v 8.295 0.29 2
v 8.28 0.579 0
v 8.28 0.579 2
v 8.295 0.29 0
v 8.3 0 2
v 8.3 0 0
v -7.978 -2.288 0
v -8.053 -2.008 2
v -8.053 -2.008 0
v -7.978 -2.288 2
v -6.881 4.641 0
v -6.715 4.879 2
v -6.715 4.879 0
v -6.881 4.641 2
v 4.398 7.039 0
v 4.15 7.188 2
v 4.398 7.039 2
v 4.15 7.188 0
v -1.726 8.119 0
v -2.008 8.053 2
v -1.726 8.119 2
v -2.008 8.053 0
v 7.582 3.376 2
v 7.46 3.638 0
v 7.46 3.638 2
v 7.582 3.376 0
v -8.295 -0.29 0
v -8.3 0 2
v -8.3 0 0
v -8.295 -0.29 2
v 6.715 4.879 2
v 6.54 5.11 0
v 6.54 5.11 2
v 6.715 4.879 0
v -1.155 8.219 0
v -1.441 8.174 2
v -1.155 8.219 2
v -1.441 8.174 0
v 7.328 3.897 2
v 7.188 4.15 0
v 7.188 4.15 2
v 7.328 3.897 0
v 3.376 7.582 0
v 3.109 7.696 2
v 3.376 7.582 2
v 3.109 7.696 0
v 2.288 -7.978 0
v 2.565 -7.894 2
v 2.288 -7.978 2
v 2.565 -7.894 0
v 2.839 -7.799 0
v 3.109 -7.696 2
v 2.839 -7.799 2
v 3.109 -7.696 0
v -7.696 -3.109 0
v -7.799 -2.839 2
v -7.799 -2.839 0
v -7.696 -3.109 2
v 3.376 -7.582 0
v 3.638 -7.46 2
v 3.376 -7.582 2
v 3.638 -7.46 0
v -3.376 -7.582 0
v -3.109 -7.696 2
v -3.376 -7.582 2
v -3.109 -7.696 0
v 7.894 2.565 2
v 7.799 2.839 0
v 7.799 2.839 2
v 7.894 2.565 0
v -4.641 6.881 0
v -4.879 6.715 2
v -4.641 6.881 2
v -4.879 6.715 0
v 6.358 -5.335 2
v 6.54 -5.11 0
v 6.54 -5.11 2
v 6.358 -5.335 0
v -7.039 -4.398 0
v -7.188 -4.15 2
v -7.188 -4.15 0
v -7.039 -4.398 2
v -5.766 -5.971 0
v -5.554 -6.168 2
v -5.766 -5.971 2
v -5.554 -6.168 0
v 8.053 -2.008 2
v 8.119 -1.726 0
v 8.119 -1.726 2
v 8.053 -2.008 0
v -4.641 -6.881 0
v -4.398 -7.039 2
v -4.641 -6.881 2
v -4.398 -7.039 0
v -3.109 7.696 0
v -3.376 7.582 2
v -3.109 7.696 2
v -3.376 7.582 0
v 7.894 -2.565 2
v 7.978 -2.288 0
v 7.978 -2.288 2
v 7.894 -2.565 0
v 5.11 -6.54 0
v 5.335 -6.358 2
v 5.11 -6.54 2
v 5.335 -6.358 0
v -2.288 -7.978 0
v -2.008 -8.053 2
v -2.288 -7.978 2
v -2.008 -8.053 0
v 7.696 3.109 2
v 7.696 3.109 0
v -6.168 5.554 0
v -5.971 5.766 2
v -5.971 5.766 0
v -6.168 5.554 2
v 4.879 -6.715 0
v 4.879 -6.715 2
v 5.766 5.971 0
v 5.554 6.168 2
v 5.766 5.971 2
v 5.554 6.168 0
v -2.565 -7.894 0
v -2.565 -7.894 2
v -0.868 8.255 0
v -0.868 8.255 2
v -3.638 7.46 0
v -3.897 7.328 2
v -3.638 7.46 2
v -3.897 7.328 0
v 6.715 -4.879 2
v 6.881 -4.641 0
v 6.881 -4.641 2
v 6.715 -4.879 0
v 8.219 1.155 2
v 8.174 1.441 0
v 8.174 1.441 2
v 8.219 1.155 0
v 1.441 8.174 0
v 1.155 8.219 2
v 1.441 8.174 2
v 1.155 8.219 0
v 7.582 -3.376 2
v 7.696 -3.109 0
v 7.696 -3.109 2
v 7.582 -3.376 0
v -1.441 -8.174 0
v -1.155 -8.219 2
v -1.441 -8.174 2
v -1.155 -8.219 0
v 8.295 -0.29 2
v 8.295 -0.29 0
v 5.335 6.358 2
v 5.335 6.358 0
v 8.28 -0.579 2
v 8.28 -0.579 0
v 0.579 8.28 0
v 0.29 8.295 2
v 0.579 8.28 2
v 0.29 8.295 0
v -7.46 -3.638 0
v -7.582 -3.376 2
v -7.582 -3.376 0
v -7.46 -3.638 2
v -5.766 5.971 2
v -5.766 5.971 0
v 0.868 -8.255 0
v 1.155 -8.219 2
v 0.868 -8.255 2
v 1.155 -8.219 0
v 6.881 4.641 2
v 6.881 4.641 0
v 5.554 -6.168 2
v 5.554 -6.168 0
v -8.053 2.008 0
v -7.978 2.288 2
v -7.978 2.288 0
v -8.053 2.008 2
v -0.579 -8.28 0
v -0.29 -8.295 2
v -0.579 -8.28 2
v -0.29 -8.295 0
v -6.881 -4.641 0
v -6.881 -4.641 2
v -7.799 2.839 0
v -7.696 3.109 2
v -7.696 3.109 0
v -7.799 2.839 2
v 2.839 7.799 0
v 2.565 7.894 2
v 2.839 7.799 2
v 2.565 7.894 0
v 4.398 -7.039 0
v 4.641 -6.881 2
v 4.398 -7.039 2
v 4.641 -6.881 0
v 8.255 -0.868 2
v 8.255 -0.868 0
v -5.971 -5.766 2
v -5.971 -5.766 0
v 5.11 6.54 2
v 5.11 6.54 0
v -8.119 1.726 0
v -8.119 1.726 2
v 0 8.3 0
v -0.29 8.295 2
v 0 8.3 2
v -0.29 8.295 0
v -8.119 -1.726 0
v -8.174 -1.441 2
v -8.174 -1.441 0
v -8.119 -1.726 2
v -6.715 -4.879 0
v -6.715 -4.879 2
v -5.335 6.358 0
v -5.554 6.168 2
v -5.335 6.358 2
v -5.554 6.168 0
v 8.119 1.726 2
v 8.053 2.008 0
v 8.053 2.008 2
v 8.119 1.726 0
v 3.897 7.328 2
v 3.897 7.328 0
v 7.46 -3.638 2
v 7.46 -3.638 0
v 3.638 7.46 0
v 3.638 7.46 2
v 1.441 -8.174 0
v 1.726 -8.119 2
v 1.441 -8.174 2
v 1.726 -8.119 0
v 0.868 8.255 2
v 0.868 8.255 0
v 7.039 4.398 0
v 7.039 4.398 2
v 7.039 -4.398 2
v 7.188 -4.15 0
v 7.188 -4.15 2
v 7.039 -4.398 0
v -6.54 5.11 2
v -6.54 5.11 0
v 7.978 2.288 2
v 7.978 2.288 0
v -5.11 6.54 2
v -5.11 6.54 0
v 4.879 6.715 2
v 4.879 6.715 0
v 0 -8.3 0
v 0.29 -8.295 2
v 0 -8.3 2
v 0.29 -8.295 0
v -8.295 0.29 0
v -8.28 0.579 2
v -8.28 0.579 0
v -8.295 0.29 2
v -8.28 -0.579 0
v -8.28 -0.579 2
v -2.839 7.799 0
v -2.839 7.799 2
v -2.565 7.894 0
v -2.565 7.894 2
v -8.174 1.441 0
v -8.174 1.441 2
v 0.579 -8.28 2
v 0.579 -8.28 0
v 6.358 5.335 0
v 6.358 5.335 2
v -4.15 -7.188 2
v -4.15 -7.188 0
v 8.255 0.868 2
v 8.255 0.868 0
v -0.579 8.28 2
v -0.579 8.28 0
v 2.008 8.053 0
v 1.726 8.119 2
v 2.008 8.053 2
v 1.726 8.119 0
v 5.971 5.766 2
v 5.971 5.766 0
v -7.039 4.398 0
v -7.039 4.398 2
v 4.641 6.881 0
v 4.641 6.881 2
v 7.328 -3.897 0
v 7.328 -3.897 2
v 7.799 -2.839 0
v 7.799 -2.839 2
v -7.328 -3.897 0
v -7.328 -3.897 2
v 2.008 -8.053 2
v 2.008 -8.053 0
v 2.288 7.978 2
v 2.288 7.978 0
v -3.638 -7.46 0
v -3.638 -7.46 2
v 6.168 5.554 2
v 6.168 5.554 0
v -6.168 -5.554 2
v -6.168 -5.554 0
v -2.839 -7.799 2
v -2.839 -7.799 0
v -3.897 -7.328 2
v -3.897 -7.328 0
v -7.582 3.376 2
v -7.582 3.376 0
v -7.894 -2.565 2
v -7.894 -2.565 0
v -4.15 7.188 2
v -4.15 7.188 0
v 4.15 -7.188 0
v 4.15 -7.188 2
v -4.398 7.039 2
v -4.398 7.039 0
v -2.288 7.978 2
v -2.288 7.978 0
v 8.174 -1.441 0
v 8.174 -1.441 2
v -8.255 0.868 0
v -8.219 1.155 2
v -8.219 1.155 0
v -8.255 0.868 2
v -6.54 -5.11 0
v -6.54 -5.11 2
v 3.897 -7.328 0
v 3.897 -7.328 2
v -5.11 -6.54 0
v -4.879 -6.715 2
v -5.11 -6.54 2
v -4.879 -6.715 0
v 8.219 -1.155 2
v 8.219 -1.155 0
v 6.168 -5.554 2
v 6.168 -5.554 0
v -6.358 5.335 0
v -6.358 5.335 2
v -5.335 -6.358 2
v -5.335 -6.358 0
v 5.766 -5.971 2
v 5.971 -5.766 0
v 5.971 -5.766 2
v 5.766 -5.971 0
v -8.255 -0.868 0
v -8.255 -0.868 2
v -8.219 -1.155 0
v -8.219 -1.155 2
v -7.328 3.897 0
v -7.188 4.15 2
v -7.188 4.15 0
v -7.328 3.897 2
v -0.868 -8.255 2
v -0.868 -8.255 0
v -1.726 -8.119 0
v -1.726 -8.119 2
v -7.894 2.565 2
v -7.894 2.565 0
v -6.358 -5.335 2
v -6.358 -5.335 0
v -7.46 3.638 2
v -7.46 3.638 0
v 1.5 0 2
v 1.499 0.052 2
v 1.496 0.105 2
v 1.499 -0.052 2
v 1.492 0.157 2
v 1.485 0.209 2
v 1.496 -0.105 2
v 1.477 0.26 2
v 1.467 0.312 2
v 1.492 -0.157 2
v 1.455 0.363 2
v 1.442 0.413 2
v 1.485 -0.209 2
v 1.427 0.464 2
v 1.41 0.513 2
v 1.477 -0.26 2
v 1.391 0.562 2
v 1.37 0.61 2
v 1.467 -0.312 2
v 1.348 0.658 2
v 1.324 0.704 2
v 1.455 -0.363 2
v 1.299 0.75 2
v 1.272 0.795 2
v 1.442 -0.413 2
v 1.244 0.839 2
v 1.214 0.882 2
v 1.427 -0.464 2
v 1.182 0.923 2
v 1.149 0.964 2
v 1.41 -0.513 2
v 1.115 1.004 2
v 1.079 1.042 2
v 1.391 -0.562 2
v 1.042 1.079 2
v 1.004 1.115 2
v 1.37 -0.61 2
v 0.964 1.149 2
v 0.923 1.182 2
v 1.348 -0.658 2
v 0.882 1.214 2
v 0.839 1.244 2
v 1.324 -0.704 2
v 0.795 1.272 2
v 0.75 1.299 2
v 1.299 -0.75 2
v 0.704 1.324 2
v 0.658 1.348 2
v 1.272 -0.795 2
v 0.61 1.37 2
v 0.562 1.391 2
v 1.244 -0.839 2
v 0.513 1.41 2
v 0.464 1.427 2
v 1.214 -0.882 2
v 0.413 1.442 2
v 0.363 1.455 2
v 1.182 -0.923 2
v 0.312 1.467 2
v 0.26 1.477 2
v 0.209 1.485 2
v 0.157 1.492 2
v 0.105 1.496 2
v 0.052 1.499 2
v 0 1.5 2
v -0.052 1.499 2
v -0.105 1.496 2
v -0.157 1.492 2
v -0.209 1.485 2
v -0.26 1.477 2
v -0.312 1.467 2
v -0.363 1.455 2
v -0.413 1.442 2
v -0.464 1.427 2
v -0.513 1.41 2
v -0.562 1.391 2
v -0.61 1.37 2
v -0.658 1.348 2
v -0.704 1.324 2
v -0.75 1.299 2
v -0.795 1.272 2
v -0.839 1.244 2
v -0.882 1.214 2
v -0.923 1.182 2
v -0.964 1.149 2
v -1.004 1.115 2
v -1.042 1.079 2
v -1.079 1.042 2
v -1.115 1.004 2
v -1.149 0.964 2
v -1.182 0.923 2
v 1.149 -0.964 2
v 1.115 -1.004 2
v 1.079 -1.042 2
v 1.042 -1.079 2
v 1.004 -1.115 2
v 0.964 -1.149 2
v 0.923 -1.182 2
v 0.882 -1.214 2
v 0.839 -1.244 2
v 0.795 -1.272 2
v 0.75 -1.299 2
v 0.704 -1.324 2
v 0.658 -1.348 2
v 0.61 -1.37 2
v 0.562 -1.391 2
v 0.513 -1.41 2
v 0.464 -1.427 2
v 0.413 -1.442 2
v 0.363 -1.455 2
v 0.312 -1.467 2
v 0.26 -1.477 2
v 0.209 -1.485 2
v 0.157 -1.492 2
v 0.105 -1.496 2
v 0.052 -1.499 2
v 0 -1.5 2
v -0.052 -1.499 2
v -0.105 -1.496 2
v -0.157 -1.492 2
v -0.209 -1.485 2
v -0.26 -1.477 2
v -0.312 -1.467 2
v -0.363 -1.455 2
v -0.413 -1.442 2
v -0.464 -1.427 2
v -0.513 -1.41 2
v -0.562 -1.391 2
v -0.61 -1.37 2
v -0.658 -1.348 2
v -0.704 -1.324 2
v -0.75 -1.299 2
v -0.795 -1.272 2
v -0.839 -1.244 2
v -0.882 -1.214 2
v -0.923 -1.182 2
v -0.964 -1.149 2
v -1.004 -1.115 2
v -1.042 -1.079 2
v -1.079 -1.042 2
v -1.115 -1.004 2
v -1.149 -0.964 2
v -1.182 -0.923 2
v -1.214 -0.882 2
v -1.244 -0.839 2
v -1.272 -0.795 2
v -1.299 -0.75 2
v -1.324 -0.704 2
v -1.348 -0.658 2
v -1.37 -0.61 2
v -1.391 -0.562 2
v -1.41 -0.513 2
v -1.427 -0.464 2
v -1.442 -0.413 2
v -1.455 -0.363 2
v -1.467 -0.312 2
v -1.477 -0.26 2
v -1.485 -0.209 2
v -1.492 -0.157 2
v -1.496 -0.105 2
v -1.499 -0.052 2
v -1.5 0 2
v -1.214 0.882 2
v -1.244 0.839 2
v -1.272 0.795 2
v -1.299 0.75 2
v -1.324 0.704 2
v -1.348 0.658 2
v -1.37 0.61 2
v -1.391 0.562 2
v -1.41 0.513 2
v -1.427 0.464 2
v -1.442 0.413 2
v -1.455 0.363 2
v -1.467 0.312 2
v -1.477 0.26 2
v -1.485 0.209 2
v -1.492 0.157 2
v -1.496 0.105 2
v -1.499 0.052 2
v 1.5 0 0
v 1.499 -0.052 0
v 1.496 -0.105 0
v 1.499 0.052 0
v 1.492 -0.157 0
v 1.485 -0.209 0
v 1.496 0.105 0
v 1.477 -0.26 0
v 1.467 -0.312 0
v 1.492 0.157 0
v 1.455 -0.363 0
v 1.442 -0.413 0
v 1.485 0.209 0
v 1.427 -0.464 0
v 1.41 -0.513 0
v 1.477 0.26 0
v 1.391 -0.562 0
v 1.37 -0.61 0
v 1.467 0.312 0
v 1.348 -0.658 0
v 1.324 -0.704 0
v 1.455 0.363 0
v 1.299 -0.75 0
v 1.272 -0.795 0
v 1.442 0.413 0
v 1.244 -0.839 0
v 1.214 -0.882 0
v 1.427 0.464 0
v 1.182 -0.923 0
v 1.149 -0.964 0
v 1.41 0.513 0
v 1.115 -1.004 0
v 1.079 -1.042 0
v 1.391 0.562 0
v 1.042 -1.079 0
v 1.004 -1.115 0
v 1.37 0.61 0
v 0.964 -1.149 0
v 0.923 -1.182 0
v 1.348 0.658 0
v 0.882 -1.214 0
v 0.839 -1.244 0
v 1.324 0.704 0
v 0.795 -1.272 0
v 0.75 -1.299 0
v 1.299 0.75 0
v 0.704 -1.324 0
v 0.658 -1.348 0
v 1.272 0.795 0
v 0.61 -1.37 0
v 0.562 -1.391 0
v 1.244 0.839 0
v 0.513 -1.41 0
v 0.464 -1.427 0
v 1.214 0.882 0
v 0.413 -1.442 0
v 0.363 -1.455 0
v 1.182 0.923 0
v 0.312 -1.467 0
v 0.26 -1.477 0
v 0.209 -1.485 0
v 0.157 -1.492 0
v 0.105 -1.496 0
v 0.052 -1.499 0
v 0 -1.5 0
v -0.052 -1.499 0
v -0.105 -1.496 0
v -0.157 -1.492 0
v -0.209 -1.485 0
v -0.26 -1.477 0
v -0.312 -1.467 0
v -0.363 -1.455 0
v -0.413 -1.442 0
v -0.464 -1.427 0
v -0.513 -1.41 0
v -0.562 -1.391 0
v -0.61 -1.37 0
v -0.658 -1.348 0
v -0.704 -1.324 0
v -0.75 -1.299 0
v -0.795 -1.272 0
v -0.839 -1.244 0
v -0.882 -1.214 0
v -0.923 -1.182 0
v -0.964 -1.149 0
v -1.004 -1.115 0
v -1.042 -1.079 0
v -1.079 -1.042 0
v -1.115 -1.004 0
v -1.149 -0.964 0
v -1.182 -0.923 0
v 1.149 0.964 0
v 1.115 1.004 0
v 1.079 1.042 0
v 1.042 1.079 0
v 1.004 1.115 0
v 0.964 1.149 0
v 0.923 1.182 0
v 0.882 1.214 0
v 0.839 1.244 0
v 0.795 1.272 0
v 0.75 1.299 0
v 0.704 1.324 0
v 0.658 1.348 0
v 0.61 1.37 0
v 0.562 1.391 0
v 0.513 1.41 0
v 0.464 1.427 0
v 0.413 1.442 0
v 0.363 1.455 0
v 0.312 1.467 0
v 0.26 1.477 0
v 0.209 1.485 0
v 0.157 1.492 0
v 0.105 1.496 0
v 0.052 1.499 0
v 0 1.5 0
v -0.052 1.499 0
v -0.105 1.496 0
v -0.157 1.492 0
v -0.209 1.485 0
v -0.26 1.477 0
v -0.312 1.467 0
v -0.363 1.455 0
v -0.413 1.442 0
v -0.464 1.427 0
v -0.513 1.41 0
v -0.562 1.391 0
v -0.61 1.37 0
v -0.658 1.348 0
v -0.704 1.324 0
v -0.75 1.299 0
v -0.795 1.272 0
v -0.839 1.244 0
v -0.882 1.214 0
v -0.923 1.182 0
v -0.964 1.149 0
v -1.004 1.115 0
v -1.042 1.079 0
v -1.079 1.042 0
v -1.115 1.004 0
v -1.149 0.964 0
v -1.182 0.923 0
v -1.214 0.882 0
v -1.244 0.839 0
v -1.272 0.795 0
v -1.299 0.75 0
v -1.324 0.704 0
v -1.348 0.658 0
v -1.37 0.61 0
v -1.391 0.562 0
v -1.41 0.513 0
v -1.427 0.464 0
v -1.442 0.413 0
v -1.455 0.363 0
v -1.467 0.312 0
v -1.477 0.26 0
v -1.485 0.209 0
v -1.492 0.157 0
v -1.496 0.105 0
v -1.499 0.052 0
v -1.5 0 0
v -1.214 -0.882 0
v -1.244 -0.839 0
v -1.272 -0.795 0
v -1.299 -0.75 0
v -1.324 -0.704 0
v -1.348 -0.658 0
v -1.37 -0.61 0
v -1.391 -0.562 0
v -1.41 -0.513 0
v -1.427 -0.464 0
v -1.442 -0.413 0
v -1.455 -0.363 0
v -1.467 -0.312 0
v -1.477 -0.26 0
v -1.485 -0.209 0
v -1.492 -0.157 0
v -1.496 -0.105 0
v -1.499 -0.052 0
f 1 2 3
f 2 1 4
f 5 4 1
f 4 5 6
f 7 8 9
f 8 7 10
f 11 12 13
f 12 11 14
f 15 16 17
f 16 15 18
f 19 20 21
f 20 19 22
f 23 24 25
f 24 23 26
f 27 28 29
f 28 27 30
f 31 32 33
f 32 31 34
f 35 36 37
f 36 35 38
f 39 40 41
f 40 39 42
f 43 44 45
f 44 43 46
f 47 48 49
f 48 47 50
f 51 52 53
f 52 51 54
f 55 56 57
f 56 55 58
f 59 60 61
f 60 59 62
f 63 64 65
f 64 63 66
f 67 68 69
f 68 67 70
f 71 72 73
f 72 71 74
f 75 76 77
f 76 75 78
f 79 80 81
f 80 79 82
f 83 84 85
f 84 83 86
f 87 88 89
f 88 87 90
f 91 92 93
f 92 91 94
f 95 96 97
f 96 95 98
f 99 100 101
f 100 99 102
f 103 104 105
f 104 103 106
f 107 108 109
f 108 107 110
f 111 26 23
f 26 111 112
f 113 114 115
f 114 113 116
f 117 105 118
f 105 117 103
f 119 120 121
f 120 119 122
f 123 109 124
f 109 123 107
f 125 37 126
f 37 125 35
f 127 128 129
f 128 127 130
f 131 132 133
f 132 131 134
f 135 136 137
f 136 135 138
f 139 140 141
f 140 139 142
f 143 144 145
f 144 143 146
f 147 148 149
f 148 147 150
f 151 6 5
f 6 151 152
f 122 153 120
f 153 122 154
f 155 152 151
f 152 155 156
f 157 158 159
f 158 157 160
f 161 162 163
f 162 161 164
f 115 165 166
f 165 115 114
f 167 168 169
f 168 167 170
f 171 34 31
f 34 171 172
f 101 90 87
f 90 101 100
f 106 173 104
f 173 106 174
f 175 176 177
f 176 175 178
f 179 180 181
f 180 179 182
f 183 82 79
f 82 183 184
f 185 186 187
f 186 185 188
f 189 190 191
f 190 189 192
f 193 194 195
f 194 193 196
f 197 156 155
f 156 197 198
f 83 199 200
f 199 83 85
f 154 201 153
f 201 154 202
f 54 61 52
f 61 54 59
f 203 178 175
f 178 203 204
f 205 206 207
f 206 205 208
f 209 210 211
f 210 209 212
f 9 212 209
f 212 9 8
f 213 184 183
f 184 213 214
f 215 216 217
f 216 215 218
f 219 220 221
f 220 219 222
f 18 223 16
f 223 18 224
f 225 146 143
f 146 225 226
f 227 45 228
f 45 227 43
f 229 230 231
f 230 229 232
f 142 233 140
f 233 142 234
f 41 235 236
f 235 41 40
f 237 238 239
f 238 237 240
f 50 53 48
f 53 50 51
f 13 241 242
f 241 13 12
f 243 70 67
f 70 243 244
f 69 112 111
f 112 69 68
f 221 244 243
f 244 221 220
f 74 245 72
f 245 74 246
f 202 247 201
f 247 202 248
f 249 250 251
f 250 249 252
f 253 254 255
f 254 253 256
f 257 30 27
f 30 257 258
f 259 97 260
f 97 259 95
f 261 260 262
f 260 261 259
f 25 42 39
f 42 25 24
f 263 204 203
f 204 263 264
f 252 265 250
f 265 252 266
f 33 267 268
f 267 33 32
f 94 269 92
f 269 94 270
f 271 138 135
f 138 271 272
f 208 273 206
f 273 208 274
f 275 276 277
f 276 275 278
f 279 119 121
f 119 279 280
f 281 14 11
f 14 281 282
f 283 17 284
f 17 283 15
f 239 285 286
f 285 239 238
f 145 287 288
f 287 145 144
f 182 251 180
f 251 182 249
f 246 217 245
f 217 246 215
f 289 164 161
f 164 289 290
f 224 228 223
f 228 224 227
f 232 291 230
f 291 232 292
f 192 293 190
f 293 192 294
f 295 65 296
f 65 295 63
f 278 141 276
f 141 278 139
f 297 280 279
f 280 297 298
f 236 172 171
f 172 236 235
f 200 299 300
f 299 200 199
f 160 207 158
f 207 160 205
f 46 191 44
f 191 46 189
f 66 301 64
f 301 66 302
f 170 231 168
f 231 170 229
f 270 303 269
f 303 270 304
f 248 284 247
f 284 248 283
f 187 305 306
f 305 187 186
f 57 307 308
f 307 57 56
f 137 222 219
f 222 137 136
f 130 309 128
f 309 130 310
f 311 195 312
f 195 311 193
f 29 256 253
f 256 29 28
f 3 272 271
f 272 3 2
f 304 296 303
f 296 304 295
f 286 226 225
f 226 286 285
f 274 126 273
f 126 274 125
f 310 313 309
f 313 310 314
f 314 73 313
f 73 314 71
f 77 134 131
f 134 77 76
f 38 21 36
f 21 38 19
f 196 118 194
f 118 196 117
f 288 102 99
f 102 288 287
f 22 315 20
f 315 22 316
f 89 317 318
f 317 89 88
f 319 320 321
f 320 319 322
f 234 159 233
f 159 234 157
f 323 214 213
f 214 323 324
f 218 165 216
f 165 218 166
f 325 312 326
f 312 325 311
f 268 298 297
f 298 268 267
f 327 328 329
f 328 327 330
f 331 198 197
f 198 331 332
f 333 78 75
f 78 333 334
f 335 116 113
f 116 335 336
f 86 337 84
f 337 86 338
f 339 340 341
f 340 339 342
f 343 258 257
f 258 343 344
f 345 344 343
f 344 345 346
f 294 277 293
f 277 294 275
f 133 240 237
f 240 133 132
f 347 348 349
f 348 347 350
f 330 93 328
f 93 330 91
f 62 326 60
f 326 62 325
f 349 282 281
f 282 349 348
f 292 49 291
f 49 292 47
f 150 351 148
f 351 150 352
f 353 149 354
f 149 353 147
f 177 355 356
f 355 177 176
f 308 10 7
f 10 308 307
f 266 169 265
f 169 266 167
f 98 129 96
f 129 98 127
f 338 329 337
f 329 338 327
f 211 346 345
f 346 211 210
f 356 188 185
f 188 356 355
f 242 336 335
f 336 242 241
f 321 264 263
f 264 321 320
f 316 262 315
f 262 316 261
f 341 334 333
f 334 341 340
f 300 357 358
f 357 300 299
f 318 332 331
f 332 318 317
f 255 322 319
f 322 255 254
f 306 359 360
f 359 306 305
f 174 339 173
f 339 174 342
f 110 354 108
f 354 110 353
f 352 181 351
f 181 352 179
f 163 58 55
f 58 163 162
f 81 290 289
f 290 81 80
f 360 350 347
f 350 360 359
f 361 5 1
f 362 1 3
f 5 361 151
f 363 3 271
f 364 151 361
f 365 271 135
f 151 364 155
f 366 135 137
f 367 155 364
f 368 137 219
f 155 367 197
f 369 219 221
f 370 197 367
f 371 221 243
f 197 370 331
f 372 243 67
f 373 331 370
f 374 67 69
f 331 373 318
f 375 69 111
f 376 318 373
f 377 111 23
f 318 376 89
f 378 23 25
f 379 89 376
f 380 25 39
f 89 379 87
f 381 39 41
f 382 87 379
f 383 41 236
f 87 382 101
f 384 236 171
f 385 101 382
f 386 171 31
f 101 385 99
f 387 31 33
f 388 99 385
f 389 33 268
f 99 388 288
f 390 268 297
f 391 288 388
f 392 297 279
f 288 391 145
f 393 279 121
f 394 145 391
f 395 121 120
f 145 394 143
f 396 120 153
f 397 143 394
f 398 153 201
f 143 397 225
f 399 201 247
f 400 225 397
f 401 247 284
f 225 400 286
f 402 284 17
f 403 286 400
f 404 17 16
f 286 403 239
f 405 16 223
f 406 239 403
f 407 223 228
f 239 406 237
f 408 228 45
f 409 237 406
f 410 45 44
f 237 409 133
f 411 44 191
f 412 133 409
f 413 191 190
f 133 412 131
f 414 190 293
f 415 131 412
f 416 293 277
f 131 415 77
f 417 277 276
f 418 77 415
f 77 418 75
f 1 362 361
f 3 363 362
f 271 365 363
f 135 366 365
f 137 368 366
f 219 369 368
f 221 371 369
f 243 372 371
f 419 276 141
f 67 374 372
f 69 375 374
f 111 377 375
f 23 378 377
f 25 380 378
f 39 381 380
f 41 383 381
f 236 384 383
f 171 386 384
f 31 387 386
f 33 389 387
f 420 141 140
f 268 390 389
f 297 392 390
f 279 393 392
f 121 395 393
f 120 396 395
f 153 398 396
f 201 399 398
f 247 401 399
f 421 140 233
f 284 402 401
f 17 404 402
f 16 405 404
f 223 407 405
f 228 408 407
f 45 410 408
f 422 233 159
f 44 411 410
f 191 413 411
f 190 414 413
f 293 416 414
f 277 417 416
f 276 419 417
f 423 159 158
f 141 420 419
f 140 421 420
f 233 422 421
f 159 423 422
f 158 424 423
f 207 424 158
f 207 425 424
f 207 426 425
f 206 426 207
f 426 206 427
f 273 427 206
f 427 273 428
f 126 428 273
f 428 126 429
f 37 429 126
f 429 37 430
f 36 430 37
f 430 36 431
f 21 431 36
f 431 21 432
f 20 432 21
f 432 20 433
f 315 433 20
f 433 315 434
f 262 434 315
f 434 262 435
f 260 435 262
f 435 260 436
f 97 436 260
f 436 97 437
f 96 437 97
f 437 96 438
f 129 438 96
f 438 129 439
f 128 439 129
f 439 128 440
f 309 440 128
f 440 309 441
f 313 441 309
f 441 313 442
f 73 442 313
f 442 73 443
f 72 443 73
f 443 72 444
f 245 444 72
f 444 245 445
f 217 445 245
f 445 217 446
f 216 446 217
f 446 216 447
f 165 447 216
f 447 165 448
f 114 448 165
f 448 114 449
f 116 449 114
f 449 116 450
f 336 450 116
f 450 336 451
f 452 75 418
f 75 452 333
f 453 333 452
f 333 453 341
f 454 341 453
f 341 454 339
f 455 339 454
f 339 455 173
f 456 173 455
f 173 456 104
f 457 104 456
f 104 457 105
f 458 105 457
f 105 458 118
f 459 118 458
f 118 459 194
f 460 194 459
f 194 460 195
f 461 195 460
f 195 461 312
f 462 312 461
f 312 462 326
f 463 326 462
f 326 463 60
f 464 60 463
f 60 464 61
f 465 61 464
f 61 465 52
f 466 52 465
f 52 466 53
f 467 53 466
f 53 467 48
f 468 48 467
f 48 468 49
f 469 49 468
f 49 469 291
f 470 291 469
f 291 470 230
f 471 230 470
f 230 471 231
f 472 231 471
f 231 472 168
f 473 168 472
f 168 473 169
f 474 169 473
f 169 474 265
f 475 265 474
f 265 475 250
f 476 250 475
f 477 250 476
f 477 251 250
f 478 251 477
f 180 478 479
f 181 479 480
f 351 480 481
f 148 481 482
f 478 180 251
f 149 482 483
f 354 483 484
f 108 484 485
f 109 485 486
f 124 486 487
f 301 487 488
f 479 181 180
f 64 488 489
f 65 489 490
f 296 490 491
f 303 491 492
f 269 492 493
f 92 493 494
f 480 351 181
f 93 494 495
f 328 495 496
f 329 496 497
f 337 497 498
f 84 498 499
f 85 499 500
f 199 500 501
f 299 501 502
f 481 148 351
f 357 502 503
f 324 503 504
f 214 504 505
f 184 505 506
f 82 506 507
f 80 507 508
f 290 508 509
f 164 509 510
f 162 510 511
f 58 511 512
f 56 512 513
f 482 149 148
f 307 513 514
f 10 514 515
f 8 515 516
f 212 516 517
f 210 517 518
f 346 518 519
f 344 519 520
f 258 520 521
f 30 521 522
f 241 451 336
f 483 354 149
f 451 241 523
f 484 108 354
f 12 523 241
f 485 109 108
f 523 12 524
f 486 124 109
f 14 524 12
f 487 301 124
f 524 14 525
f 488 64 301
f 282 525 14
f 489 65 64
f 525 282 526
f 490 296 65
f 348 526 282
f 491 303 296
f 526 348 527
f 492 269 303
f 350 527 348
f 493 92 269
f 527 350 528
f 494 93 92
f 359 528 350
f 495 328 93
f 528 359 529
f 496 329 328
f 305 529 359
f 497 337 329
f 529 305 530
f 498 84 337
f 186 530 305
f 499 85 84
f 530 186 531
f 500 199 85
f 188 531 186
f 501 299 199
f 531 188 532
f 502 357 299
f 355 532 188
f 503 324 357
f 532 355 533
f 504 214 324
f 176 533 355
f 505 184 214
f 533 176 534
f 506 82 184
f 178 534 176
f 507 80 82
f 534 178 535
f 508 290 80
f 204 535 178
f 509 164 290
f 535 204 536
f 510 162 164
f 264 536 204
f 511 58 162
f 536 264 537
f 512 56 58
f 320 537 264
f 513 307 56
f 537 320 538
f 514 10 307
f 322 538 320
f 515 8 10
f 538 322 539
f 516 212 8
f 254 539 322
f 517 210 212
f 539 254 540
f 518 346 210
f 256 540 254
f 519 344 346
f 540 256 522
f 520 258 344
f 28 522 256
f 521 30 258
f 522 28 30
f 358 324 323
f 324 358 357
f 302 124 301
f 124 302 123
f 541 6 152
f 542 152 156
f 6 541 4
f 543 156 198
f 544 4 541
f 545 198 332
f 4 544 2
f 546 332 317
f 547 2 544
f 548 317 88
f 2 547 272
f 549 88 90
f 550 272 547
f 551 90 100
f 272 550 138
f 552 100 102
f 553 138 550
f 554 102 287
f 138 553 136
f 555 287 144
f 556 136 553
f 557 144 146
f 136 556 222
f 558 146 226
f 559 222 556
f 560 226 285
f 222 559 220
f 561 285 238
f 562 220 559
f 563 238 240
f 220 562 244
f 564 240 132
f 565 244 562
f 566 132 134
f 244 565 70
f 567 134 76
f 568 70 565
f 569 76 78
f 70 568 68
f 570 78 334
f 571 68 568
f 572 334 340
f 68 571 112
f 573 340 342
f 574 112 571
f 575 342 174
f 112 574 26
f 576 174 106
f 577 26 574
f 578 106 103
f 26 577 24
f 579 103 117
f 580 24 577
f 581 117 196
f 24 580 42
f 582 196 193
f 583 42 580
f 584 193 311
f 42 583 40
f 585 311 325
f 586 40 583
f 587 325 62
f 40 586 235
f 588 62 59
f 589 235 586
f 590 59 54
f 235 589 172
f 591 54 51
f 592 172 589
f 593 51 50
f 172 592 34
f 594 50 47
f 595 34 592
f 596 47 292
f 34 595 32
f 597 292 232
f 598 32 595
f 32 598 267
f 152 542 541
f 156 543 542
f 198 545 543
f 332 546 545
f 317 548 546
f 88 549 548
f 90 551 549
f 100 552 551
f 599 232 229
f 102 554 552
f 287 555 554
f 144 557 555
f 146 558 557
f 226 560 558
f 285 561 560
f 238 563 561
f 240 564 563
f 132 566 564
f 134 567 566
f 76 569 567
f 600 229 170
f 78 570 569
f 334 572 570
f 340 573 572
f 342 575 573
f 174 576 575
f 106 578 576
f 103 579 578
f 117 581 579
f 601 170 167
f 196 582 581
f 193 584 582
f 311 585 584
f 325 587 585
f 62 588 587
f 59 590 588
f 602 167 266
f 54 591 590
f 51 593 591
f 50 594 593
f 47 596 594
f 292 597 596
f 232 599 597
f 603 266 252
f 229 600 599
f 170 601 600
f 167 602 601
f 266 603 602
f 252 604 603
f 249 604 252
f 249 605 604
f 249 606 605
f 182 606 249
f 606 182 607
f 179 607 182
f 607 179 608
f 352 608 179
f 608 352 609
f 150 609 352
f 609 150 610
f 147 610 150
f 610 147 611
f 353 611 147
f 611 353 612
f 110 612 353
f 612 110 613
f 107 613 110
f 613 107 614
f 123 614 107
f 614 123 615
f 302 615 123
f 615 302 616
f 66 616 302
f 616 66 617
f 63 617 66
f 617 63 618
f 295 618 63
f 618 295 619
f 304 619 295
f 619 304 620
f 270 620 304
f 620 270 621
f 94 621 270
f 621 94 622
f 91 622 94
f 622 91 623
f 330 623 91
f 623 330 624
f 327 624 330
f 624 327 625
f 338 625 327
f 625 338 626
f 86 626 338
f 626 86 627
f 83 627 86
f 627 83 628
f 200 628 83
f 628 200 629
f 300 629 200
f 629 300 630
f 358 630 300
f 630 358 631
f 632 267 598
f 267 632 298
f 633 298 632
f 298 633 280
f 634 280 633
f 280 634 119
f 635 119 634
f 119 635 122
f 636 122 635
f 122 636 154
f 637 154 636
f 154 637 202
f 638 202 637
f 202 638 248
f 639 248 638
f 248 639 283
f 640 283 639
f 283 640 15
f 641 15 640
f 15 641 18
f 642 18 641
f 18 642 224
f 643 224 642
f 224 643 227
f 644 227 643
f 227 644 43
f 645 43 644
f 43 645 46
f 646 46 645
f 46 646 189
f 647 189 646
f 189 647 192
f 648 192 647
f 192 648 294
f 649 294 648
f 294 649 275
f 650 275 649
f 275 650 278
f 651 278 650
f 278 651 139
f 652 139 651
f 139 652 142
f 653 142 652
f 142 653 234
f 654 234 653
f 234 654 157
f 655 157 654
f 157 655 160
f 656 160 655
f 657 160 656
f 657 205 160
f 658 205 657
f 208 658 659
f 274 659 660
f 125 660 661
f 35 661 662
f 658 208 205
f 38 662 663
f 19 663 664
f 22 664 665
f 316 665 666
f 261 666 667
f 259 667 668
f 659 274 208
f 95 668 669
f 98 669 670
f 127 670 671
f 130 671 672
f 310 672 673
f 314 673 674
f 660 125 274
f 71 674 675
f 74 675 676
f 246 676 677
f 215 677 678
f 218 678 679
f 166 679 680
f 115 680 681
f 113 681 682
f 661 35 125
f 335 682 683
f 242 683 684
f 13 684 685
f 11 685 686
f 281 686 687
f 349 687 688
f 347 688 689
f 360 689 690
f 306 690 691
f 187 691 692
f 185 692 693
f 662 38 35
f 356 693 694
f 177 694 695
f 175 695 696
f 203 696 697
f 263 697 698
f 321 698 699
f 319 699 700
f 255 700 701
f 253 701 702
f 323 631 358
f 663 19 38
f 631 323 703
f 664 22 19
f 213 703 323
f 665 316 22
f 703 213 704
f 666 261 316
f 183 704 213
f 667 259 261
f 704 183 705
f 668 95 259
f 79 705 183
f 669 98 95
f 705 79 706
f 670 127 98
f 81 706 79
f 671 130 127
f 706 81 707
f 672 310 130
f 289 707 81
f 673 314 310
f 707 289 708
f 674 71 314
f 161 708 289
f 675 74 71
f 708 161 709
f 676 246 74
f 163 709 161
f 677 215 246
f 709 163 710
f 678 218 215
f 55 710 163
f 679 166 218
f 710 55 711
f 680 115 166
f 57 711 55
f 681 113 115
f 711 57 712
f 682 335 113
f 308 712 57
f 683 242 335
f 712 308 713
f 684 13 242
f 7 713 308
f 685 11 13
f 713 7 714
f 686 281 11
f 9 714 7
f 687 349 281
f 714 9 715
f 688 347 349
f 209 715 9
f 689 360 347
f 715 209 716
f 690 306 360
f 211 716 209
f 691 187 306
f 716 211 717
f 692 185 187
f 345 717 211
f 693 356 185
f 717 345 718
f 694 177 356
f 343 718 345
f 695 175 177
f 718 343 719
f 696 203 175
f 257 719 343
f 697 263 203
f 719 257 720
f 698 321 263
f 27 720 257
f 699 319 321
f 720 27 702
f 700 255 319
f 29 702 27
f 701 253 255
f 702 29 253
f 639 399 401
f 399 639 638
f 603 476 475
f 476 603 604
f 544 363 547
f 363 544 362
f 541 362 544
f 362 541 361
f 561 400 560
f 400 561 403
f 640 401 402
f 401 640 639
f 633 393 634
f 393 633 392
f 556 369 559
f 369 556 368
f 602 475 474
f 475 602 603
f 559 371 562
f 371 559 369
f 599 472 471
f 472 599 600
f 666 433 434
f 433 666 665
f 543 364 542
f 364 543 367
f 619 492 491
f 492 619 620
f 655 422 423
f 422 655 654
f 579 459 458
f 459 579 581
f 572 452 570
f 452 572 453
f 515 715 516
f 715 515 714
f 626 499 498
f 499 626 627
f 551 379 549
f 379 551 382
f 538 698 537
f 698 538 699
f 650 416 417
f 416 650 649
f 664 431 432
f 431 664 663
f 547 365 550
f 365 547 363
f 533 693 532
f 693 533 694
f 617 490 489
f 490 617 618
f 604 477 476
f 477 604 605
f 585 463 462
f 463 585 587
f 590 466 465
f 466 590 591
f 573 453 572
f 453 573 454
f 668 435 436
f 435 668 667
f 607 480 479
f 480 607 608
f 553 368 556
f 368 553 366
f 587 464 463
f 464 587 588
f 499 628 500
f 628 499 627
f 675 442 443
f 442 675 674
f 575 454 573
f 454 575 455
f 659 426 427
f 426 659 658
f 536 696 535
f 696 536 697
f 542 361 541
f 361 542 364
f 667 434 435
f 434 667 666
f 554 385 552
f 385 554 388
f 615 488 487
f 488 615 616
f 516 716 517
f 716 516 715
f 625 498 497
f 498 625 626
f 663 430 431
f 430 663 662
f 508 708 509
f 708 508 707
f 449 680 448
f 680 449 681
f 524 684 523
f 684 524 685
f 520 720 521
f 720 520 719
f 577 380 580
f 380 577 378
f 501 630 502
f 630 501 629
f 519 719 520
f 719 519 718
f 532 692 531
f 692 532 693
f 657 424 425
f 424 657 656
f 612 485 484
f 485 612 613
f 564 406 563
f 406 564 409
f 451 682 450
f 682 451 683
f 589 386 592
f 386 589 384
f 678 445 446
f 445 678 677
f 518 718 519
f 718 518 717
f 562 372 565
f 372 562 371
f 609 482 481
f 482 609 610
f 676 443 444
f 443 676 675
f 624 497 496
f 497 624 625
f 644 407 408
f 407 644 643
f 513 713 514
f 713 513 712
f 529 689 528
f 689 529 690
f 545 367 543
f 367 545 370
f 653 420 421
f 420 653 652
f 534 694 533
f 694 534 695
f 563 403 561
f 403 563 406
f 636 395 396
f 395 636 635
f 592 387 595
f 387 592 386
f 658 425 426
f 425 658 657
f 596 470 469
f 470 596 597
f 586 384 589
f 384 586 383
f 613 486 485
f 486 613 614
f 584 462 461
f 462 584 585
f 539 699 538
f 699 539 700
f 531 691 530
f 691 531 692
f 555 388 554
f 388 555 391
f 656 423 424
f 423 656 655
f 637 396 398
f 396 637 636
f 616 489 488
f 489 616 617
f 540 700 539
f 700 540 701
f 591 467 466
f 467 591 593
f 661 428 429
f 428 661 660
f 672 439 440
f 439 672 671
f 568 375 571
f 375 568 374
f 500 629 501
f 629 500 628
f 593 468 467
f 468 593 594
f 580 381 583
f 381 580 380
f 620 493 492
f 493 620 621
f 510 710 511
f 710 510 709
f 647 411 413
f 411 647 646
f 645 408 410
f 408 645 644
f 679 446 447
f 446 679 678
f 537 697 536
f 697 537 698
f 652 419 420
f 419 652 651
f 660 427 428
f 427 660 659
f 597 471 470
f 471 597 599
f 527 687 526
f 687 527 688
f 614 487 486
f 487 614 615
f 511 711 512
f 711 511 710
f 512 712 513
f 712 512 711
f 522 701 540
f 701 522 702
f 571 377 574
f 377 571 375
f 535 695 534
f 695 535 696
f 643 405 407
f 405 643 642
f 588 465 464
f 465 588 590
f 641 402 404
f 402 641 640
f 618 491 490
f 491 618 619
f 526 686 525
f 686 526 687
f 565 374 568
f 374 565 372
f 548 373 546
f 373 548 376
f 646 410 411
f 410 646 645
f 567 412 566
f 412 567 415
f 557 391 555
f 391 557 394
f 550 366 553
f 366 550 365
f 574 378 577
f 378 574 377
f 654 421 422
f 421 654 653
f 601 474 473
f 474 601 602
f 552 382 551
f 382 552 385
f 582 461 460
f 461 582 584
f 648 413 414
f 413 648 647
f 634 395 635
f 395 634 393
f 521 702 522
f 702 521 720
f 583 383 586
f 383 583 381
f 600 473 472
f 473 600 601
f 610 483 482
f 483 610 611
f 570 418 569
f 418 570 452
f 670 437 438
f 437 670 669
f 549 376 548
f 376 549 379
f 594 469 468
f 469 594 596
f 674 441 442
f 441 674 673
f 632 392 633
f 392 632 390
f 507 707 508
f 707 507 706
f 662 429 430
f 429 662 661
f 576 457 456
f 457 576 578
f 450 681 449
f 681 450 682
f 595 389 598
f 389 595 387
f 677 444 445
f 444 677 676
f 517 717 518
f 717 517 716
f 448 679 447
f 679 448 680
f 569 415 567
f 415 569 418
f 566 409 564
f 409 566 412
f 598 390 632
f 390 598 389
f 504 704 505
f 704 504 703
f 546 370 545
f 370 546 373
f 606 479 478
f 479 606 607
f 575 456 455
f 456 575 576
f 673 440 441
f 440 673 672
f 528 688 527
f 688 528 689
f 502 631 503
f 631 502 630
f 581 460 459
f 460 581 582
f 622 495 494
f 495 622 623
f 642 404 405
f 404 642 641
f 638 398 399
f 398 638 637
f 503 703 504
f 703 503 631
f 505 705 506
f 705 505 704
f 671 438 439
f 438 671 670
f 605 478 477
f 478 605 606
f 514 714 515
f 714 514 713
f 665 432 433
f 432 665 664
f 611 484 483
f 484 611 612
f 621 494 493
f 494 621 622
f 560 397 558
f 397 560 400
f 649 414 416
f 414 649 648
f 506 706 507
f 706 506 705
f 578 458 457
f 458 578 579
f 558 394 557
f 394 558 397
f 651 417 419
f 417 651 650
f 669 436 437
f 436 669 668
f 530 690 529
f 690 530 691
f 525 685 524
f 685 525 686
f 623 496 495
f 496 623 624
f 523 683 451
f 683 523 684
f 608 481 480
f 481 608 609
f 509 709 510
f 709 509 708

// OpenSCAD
$fn = 180;
difference() {
    cylinder(h=2, d=16.6);
    cylinder(h=2, d=3,2);
}
